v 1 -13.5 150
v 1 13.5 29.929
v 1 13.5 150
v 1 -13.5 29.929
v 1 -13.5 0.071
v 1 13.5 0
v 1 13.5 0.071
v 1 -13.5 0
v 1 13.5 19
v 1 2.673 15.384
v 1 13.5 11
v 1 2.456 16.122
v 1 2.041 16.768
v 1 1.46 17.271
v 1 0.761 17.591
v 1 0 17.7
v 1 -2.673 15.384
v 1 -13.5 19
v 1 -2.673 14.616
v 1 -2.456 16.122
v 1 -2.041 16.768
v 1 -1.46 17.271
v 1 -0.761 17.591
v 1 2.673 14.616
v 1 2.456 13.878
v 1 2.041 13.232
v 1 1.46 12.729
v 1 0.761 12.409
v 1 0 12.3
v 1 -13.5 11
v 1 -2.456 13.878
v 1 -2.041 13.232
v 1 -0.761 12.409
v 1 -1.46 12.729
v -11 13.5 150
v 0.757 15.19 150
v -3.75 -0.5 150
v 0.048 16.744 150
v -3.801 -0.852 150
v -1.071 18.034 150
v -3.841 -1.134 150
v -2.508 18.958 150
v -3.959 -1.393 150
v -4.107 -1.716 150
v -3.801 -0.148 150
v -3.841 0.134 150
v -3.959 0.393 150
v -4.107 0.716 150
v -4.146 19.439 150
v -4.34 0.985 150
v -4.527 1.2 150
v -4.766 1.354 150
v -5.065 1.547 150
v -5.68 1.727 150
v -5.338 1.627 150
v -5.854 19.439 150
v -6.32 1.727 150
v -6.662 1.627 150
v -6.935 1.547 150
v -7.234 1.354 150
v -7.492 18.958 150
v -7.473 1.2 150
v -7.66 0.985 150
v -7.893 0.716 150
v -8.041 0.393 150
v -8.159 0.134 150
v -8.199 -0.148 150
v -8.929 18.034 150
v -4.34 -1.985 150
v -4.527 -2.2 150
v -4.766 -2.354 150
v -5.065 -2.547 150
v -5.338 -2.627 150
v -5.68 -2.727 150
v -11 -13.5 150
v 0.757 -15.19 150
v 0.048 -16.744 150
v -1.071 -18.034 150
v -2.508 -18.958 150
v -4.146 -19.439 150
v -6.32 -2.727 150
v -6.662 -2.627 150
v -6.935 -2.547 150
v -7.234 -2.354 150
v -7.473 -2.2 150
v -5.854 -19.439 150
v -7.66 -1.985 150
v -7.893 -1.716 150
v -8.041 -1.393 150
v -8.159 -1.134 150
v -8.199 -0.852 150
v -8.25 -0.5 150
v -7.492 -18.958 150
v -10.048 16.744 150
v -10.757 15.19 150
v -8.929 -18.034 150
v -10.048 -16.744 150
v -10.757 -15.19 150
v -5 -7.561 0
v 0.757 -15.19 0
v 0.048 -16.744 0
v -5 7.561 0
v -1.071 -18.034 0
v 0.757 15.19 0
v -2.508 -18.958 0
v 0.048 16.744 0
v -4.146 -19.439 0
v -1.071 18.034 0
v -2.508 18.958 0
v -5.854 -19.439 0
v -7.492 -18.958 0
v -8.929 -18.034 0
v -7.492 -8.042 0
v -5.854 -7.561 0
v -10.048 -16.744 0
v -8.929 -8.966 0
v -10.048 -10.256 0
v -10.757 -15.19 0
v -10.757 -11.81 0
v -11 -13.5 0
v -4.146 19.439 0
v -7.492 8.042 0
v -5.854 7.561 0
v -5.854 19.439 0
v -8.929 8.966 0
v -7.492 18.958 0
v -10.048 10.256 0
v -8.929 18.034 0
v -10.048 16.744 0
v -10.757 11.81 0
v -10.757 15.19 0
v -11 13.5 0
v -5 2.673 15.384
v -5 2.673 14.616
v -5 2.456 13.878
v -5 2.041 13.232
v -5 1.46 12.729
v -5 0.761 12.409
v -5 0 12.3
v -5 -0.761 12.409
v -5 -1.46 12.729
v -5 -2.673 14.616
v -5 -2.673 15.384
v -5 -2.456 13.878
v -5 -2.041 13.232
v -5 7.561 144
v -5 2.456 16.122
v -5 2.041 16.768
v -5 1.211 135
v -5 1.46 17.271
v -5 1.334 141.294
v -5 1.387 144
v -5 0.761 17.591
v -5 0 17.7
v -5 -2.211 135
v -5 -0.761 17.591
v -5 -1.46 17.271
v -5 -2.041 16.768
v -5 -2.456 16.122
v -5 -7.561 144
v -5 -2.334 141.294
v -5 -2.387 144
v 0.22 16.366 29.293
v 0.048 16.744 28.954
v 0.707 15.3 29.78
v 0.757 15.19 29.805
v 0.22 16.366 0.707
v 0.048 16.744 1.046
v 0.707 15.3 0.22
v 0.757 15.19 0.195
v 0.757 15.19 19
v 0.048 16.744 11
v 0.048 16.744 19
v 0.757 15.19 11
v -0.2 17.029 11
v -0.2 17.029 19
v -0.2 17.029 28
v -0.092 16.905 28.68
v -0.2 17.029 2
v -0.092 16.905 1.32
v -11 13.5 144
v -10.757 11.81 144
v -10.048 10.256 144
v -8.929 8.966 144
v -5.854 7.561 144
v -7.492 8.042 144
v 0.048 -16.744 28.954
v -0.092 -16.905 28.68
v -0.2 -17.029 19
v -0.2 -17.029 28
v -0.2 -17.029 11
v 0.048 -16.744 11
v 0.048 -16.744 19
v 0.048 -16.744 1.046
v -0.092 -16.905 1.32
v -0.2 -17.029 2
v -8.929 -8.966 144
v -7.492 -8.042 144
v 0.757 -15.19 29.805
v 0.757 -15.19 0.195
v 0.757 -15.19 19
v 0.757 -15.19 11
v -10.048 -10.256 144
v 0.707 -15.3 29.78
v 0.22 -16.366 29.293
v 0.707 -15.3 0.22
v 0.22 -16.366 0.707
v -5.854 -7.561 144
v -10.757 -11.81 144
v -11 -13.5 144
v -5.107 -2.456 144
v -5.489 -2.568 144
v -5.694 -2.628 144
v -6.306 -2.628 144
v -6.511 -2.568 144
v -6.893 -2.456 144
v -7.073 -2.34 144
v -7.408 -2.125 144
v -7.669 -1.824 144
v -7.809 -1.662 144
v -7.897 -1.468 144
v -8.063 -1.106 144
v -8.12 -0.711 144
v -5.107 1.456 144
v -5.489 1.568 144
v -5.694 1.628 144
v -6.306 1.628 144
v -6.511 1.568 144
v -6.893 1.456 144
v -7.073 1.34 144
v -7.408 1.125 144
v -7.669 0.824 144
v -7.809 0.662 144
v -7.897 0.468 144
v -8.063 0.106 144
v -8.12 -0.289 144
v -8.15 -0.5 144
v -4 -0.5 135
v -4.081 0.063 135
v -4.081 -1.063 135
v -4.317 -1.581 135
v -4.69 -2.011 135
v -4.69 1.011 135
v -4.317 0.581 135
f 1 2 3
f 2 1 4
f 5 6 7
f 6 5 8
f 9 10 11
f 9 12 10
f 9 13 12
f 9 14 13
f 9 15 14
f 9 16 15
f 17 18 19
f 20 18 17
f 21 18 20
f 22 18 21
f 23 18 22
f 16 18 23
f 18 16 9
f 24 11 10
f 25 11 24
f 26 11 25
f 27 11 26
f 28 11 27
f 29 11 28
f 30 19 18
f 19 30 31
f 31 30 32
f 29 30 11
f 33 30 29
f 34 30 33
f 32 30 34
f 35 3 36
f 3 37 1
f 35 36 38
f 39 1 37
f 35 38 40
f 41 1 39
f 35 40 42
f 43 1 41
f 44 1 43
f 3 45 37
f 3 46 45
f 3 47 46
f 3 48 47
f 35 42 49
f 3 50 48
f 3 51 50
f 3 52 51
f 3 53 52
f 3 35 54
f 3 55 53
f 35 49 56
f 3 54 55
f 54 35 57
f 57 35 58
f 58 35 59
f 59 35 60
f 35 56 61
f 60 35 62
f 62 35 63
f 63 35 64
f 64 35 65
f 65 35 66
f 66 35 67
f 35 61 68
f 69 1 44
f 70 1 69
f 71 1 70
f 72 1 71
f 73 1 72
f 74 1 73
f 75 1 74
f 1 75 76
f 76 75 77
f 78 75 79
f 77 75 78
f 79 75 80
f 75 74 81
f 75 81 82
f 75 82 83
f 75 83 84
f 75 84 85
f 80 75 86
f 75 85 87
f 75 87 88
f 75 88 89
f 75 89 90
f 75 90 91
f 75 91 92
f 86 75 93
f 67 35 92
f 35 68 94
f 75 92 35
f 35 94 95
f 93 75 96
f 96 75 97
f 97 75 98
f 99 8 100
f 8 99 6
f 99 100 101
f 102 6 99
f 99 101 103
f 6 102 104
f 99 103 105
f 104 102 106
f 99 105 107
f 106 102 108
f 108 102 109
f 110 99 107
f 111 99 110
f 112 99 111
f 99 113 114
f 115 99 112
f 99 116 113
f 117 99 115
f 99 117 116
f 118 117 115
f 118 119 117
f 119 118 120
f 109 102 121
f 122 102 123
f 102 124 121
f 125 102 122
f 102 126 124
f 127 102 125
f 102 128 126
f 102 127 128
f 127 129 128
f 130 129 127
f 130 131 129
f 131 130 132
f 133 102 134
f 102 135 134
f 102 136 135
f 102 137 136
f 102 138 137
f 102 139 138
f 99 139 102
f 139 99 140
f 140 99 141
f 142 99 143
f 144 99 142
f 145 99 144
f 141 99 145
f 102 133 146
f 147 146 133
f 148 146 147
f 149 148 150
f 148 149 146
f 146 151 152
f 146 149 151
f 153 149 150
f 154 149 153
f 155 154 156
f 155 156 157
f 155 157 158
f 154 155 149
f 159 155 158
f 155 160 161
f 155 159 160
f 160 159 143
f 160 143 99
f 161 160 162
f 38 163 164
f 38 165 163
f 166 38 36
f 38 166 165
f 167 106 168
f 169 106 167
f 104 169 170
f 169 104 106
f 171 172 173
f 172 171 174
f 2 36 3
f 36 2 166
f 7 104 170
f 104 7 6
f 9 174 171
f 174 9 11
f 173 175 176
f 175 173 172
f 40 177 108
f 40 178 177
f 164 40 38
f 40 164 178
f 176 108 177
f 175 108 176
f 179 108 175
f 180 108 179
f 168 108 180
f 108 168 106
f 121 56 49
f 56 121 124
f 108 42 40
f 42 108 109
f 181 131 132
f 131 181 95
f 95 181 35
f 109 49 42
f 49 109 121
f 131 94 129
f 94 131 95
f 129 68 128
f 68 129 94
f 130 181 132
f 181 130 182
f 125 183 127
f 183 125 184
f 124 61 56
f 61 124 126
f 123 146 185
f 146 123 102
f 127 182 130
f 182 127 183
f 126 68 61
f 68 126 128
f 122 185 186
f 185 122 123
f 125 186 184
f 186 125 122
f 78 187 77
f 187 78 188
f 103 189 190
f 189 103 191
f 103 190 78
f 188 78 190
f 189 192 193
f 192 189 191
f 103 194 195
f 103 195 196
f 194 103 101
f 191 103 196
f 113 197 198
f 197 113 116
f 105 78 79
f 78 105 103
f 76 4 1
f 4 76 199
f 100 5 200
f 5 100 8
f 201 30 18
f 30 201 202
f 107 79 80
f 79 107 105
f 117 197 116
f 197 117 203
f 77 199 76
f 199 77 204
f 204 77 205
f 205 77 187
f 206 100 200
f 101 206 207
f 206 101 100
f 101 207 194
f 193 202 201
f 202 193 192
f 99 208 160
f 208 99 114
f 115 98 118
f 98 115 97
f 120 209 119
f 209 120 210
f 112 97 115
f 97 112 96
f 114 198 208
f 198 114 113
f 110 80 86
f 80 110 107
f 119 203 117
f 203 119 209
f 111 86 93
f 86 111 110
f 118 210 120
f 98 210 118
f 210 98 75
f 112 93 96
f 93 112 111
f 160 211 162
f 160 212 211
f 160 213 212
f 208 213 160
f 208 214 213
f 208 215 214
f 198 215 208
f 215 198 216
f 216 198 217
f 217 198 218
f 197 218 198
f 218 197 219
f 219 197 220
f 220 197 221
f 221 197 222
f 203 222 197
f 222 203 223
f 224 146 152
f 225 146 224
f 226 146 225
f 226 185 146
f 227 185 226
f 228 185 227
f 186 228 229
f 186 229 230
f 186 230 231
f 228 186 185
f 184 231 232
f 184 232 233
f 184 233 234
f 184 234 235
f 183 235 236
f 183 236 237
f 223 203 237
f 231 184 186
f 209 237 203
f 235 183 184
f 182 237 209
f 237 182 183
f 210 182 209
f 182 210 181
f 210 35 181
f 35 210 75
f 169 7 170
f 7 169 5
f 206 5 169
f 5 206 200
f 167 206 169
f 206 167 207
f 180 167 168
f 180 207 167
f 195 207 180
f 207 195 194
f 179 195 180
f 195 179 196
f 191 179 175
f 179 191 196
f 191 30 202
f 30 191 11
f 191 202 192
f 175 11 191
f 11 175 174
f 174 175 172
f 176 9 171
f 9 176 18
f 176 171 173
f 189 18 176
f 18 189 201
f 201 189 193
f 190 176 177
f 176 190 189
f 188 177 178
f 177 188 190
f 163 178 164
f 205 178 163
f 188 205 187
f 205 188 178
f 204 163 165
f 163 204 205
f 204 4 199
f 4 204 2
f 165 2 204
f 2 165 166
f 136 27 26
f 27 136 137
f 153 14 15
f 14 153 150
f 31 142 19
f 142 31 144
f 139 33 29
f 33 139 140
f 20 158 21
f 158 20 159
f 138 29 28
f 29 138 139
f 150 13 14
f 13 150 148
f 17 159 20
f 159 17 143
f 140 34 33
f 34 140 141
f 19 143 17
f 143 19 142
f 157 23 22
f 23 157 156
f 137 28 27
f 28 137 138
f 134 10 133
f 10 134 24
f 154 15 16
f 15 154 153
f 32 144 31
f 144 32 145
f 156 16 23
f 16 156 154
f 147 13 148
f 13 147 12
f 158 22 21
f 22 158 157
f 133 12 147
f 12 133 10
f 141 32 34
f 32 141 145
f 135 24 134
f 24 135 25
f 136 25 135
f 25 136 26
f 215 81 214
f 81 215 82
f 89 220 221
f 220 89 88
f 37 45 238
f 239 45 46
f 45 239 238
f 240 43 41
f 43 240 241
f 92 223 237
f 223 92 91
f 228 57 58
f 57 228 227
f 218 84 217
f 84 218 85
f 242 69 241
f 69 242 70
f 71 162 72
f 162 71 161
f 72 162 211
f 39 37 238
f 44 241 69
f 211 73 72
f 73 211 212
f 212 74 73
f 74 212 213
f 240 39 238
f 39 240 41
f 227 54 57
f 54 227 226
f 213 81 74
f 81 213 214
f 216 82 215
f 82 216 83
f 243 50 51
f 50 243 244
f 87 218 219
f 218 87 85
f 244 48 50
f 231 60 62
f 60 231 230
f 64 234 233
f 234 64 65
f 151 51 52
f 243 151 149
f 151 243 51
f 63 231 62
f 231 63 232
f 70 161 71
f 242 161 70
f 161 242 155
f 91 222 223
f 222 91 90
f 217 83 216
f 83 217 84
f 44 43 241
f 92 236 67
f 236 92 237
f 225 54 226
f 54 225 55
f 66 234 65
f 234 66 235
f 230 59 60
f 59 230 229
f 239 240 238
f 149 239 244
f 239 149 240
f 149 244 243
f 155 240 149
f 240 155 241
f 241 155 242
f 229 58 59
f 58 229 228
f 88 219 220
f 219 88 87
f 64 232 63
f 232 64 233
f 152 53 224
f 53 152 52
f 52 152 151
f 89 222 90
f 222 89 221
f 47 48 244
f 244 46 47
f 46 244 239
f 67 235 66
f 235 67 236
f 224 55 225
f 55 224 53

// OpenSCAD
// file: ../Parts/rounder.scad
// rounder.scad
// cutting tool for rounding off corners with a cylinder

//---------------------
module rounder(
r=10,   // radius
h=10,   // height
f=22,    // $fn
extra=0.01  // extra size for the cube
){

difference(){
  translate([-extra,-extra,-extra])
  cube([r+extra,r+extra,h+2*extra]);
  translate([r,r,-1])
  cylinder(r=r,h=h+2,$fn=f);
}

}

//---------------------------------------------------------------------------
module bevel(x=1,y=1,h=10){

linear_extrude(height=h)
polygon(points=[[0,0],[x,0],[0,y]]);
    
}
  

//========================

rounder();

//========================
// file: ../Parts/hexcut.scad
// hexcut

//--------------------------------
module hexcut1(
R=1,
x0=0,
y0=0,
h0=10,
N0=4
){
        
    for (i=[0:N0-1]){
        translate([x0,y0+i*R*2,-1])
        cylinder(r=R,h=h0,$fn=6);
    }
    for (i=[0:N0-2]){
        translate([x0-1.717*R,y0+R+i*R*2,-1])
        cylinder(r=R,h=h0,$fn=6);
    }
    for (i=[0:N0-2]){
        translate([x0+1.717*R,y0+R+i*R*2,-1])
        cylinder(r=R,h=h0,$fn=6);
    }

}


//=======================
    
hexcut1();
    
    
// file: ../Parts/cambracket1.scad
//======================================================================
// cambracket1.scad
// This is the forks
use <cambase1.scad>
use <camlid1.scad>
use <rounder.scad>

//======================================================================

module old_cambracket1(){
  difference(){
  union(){
  // left side of bracket
  hull(){
      color("red")
      translate([-6,4,2.5])
      rotate([0,90,0])
      cylinder(r1=3,r2=3.5,h=4,$fn=80);

      color("pink")
      translate([-4,-12,2.5])
      sphere(2,$fa=5, $fs=0.1);
  }

  hull(){
      color("pink")
      translate([-4,-12,2.5])
      sphere(2,$fa=5, $fs=0.1);

      color("blue")
      translate([12.5,-14,2.5])
      sphere(3,$fa=5, $fs=0.1);
  }

  // mirror as right side
  translate([25,0,0])
  mirror([1,0,0]){
  hull(){
      color("red")
      translate([-6,4,2.5])
      rotate([0,90,0])
      cylinder(r1=3,r2=3.5,h=4,$fn=80);

      color("pink")
      translate([-4,-12,2.5])
      sphere(2,$fa=5, $fs=0.1);
  }

  hull(){
      color("pink")
      translate([-4,-12,2.5])
      sphere(2,$fa=5, $fs=0.1);

      color("blue")
      translate([12.5,-14,2.5])
      sphere(3,$fa=5, $fs=0.1);
  }
  }
      // the vertical pole
      translate([12.5,-14,2.5]){
          rotate([0,0,0]){
          color("red")
          rotate([90,0,0])
          cylinder(r=2,h=15,$fn=80);

          translate([0,-15,0])
          rotate([90,0,0])
          color("green")
          cylinder(r1=2,r2=1,h=2,$fn=80);

          color("cyan")
          rotate([90,0,0])
          cylinder(r1=3.0,r2=2,h=5,$fn=80);
          }
      }
  }

  cambase1();
  } // end of difference
}

module cambracket1(){
  difference(){
  union(){
  // left side of bracket
  hull(){
      color("red")
      translate([-6,4,2.5])
      rotate([0,90,0])
      cylinder(r=4,h=4,$fn=80);

      color("pink")
      translate([-4,-12,2.5])
      //sphere(2,$fa=5, $fs=0.1);
      cube([4,8,8],center=true);
  }

  // mirror as right side
  translate([25,0,0])
  mirror([1,0,0]){
    hull(){
        color("red")
        translate([-6,4,2.5])
        rotate([0,90,0])
        cylinder(r=4,h=4,$fn=80);

        color("pink")
        translate([-4,-12,2.5])
        //sphere(2,$fa=5, $fs=0.1);
        cube([4,8,8],center=true);
    }
  }
  
    // crossbar
    translate([12.5,-14,2.5])
    cube([37,6,8],center=true);

    rr=3;
    translate([12.5+14.5,-11,-1.5])
    rotate([0,0,90])
    rounder(r=rr,h=8,f=22);  
    translate([12.5-14.5,-11,-1.5])
    rotate([0,0,0])
    rounder(r=rr,h=8,f=22);  
    
    // the vertical pole
    translate([12.5,-14,2.5]){
        rotate([0,0,0]){
        color("red")
        rotate([90,0,0])
        cylinder(r=2,h=15,$fn=80);

        translate([0,-15,0])
        rotate([90,0,0])
        color("green")
        cylinder(r1=2,r2=1,h=2,$fn=80);

        color("cyan")
        rotate([90,0,0])
        cylinder(r1=3.0,r2=2,h=5,$fn=80);
        }
    }
  }
  
  rr=3;
  translate([12.5+14.5+4,-12-5,-1.5])
  rotate([0,0,90])
  rounder(r=rr,h=8,f=22);  
  translate([12.5-14.5-4,-12-5,-1.5])
  rotate([0,0,0])
  rounder(r=rr,h=8,f=22);  
    
  cambase1();
  } // end of difference
}

//======================================================================

cambracket1();

//~ cambase1();

//~ camlid1();

//======================================================================
// file: ../Parts/camlid1.scad
// camlid1.scad
// This is the front plate
use <cambase1.scad>

module camlid1(){
    
difference(){
union(){
    // main boss
    translate([0,0,-1])
    color("yellow")
    linear_extrude(height=7)
    offset(r=3,$fn=80)    
    square(size=[25,24]);

    // camera bump boss
    translate([12.5,12,6])
    color("green")
    linear_extrude(height=5,scale=0.70)
    offset(r=3,$fn=80)
    square([25,24],center=true);

}
    // main boss cutout
    translate([0,0,-2])
    color("orange")
    linear_extrude(height=7)
    offset(r=2,$fn=16)    
    square(size=[25,24]);

    // side cuts for articulation
    translate([26.9,-7.5,1])
    color("pink")
    rotate([-45,0,0])
    cube([6.1,22,18]);

    translate([-8,-7.5,1])
    color("green")
    rotate([-45,0,0])
    cube([6.1,22,18]);

    // bottom cut for cable
    translate([-5,-6,-2])
    color("green")
    cube([35,6,7]);

    // hollow out the camera bump
    translate([12.5,12,4.5])
    color("green")
    linear_extrude(height=5.5,scale=0.70)
    offset(r=3,$fn=16)
    square([15,19],center=true);

    // hole for the lens
    translate([12.5,9.75,9])
    color("cyan")
    cylinder(r1=3.5,r2=6.0,h=2.1,$fn=80);
}

// support for ribbon cable
translate([4.25,-2.5,4.5])
rotate([0,90,0])
scale([1,2]){
  difference(){
    union(){
        sphere(r=1.5,$fa=5, $fs=0.1);
        translate([0,0,16.5])
        sphere(r=1.5,$fa=5, $fs=0.1);
        cylinder(r=1.5,h=16.5,$fn=80);
    }
        translate([-5,0,-5])    
        cube([10,10,50]);
    }
}

    // tab near cable
    translate([-1,-3,3])
    color("pink")
    cube([27,1,2]);

    // tab topside
    translate([0,25.5,-1])
    color("cyan")
    cube([25,0.5,1]);

    // tab left
    translate([-2.0,20,-1])
    color("cyan")
    cube([0.5,4,1]);

    // tab right
    translate([26.5,20,-1])
    color("cyan")
    cube([0.5,4,1]);

}  // end of module 

camlid1();

//cambase1();
// file: ../Parts/cambase1.scad
// cambase1.scad
// This is the back for the camera

use <hexcut.scad>


module cambase1(){
    
// main shell
difference(){
    color("yellow")
    linear_extrude(height=5)
    offset(r=2,$fn=80)    
    square(size=[25,24]);

    translate([0,0,1])
    color("orange")
    linear_extrude(height=5)
    offset(r=0.3,$fn=16)    
    square(size=[25,24]);

    translate([4,-3,1])
    color("green")
    cube([17,5,5]);

}
translate([3,-2.5,1.0])
rotate([0,90,0])
scale([1,2]){
    sphere(r=1.0,$fa=5, $fs=0.1);
    translate([0,0,19])
    sphere(r=1.0,$fa=5, $fs=0.1);
    cylinder(r=1.0,h=19,$fn=80);
}
// posts to support PCB
translate([2.0,9.5,1]){
    cylinder(r=2,h=3,$fn=16);
    cylinder(r=0.8,h=4,$fn=16);
}
translate([2.0,22,1]){
    cylinder(r=2,h=3,$fn=16);
    cylinder(r=0.8,h=4,$fn=16);
}
translate([23.0,9.5,1]){
    cylinder(r=2,h=3,$fn=16);
    cylinder(r=0.8,h=4,$fn=16);
}
translate([23.0,22,1]){
    cylinder(r=2,h=3,$fn=16);
    cylinder(r=0.8,h=4,$fn=16);
}

// pivots on sides to mount
translate([-5,4,2.5])
color("pink")
rotate([0,90,0])
cylinder(r1=2,r2=2.25,h=3,$fn=12);

translate([30,4,2.5])
color("pink")
rotate([0,-90,0])
cylinder(r1=2,r2=2.25,h=3,$fn=12);


} // end module cambase1

//-------------------------
// No pins on the sides
module cambase2(){
    
// main shell
difference(){
    color("yellow")
    linear_extrude(height=5)
    offset(r=2,$fn=80)    
    square(size=[25,24]);

    translate([0,0,1])
    color("orange")
    linear_extrude(height=5)
    offset(r=0.2,$fn=16)    
    square(size=[25,24]);

    translate([4,-3,1])
    color("green")
    cube([17,5,5]);

}
translate([3-3,-2.5,1.0])
rotate([0,90,0])
scale([1,2]){
    sphere(r=1.0,$fa=5, $fs=0.1);
    translate([0,0,19+6])
    sphere(r=1.0,$fa=5, $fs=0.1);
    cylinder(r=1.0,h=19+6,$fn=80);
}
// posts to support PCB
translate([2.0,9.5,1]){
    cylinder(r=2,h=3,$fn=16);
    cylinder(r=0.8,h=4,$fn=16);
}
translate([2.0,22,1]){
    cylinder(r=2,h=3,$fn=16);
    cylinder(r=0.8,h=4,$fn=16);
}
translate([23.0,9.5,1]){
    cylinder(r=2,h=3,$fn=16);
    cylinder(r=0.8,h=4,$fn=16);
}
translate([23.0,22,1]){
    cylinder(r=2,h=3,$fn=16);
    cylinder(r=0.8,h=4,$fn=16);
}


} // end module cambase1
//----------------------------------
// decorate cambase2
module cambase3(){
    
    difference(){
        cambase2();    
        hexcut1(x0=12.5,y0=3,R=3);
    }
}

//=================================

//translate([80,0,0])
//cambase1();

//translate([40,0,0])
//cambase2();

cambase3();

//cambase1();

//translate([0,0,30])
//cambase2();
// file: ../Parts/tslot.scad
//=================================================================================
// tslot
// models for tslots used in PrusaDusa
// 
// Tom Flint, 2020
//=================================================================================
module tslot1(
tol = 0.0,
len = 60,
type = 1
){
    
// 30x30     
if(type==1){
    linear_extrude(height=len,convexity=10)
    difference(){
        offset(r=2.0+tol,$fn=20)
        square([26,26],center=true);
 
        translate([0,12,0])
        square([8.2-tol,8.2-tol],center=true);
        translate([0,-12,0])
        square([8.2-tol,8.2-tol],center=true);
        translate([12,0,0])
        square([8.2-tol,8.2-tol],center=true);
        translate([-12,0,0])
        square([8.2-tol,8.2-tol],center=true);
    }
}
    
// 30x60
if(type==2){
    linear_extrude(height=len,convexity=10)
    difference(){
        offset(r=2.0+tol,$fn=20)
        square([26,56],center=true);
 
        translate([0,27,0])
        square([8.2-tol,8.2-tol],center=true);
        translate([0,-27,0])
        square([8.2-tol,8.2-tol],center=true);
        
        translate([12,15,0])
        square([8.2-tol,8.2-tol],center=true);
        translate([-12,15,0])
        square([8.2-tol,8.2-tol],center=true);

        translate([12,-15,0])
        square([8.2-tol,8.2-tol],center=true);
        translate([-12,-15,0])
        square([8.2-tol,8.2-tol],center=true);
    }
}
    
// 36x60
if(type==3){
    linear_extrude(height=len,convexity=10)
    difference(){
        offset(r=2.0+tol,$fn=20)
        square([56,56],center=true);
 
        translate([15,27,0])
        square([8.2-tol,8.2-tol],center=true);
        translate([15,-27,0])
        square([8.2-tol,8.2-tol],center=true);
        
        translate([-15,27,0])
        square([8.2-tol,8.2-tol],center=true);
        translate([-15,-27,0])
        square([8.2-tol,8.2-tol],center=true);
        
        translate([27,15,0])
        square([8.2-tol,8.2-tol],center=true);
        translate([-27,15,0])
        square([8.2-tol,8.2-tol],center=true);

        translate([27,-15,0])
        square([8.2-tol,8.2-tol],center=true);
        translate([-27,-15,0])
        square([8.2-tol,8.2-tol],center=true);
    }
}
    
}

//--------------------------------------
module tbrace(
tol=0.0
){

F2=22;
 
translate([0,0,2-15])    
difference(){    
union(){
        cube([4.8,60,26]);
        cube([60,4.8,26]);
    
    hull(){
        translate([60-2.4,4.8,0])
        cylinder(r=2.4,h=26,$fn=F2);
        translate([4.8,60-2.4,0])
        cylinder(r=2.4,h=26,$fn=F2);
    }
}    

        translate([15,0,26/2])
        rotate([-90,0,0])
        cylinder(r1=3.5,r2=4.5,h=60,$fn=F2);
        translate([15+30,0,26/2])
        rotate([-90,0,0])
        cylinder(r1=3.5,r2=4.5,h=60,$fn=F2);

        translate([0,15,26/2])
        rotate([0,90,0])
        cylinder(r1=3.5,r2=4.5,h=60,$fn=F2);
        translate([0,15+30,26/2])
        rotate([0,90,0])
        cylinder(r1=3.5,r2=4.5,h=60,$fn=F2);

}
}

//----------------------------------------
module lbrace(
tol=0,
holes=0,
nuts=1
){

F2=22;
    
pts1=[ [5,0], [80,0], [85,5], [85,22], [80,28],
    [28,28], [28,80], [22,85], [5,85], [0,80], [0,5] ];
    
if(holes==1){
    difference(){
        linear_extrude(height=3.25+tol,convexity=10)
        offset(r=tol)
        polygon(points=pts1);
        
        translate([16+30,14,-1])
        cylinder(r=3.25,h=5,$fn=F2);
        translate([16+60,14,-1])
        cylinder(r=3.25,h=5,$fn=F2);

        translate([14,16+30,-1])
        cylinder(r=3.25,h=5,$fn=F2);
        translate([14,16+60,-1])
        cylinder(r=3.25,h=5,$fn=F2);
    }
}else{
        linear_extrude(height=3.25+tol,convexity=10)
        offset(r=tol)
        polygon(points=pts1);
}

if(nuts==1){
    
        translate([16+30,14,0])
        cylinder(r=5,h=6+3.25,$fn=F2);
        translate([16+60,14,0])
        cylinder(r=5,h=6+3.25,$fn=F2);

        translate([14,16+30,0])
        cylinder(r=5,h=6+3.25,$fn=F2);
        translate([14,16+60,0])
        cylinder(r=5,h=6+3.25,$fn=F2);
}

}


//=======================================

lbrace();

translate([50,50,0])
lbrace(tol=0.2);

//tbrace();

/*
color("cyan")
tslot1(len=70);

color("green")
translate([0,15,0])
tslot1(type=2);

color("red")
translate([15,15,0])
tslot1(type=3,len=50);

*/

//=======================================
// main file
//======================================================================
// cams.scad
//
// Add cameras to Dusa printer
//
// DrTomFlint 27 July 2024
//======================================================================

use <../Parts/tslot.scad>
use <../Parts/cambase1.scad>
use <../Parts/camlid1.scad>
use <../Parts/cambracket1.scad>



//----------------------------------------------------------------------
module cam1(hi=150){

thick=6;
wide=27;
dent=1;
  
  difference(){  
    union(){
      translate([-thick/2+dent,0,hi/2])
      cube([thick,wide,hi],center=true);
      translate([-thick+dent,wide/2,hi/2])
      cylinder(r=thick,h=hi,$fn=22,center=true);
      translate([-thick+dent,-wide/2,hi/2])
      cylinder(r=thick,h=hi,$fn=22,center=true);

      hull(){
        translate([-thick+dent,wide/2,hi-thick/2])
        cylinder(r=thick,h=thick,$fn=22,center=true);
        translate([-thick+dent,-wide/2,hi-thick/2])
        cylinder(r=thick,h=thick,$fn=22,center=true);
      }
    }
    
    // left rail
    translate([30,-50,15])
    rotate([0,90,90])
    tslot1(type=2,len=100,tol=0.2);
    
    // cut for M5 bolt to tslot
    translate([0,0,15])
    rotate([0,90,0])
    cylinder(r=2.7,h=30,center=true,$fn=22);
    
    // cut for the camera bracket  
    translate([-thick,-0.5,hi+0])
    cylinder(r1=2,r2=2+0.5,h=30,center=true,$fn=22);

  }

}

//======================================================================

cam1();

if(0){
  translate([-thick/2,12,hi+20])
  rotate([0,0,-90])
  rotate([90,0,0]){
    cambase1();
    camlid1();
    cambracket1();
  }
}  

//======================================================================
